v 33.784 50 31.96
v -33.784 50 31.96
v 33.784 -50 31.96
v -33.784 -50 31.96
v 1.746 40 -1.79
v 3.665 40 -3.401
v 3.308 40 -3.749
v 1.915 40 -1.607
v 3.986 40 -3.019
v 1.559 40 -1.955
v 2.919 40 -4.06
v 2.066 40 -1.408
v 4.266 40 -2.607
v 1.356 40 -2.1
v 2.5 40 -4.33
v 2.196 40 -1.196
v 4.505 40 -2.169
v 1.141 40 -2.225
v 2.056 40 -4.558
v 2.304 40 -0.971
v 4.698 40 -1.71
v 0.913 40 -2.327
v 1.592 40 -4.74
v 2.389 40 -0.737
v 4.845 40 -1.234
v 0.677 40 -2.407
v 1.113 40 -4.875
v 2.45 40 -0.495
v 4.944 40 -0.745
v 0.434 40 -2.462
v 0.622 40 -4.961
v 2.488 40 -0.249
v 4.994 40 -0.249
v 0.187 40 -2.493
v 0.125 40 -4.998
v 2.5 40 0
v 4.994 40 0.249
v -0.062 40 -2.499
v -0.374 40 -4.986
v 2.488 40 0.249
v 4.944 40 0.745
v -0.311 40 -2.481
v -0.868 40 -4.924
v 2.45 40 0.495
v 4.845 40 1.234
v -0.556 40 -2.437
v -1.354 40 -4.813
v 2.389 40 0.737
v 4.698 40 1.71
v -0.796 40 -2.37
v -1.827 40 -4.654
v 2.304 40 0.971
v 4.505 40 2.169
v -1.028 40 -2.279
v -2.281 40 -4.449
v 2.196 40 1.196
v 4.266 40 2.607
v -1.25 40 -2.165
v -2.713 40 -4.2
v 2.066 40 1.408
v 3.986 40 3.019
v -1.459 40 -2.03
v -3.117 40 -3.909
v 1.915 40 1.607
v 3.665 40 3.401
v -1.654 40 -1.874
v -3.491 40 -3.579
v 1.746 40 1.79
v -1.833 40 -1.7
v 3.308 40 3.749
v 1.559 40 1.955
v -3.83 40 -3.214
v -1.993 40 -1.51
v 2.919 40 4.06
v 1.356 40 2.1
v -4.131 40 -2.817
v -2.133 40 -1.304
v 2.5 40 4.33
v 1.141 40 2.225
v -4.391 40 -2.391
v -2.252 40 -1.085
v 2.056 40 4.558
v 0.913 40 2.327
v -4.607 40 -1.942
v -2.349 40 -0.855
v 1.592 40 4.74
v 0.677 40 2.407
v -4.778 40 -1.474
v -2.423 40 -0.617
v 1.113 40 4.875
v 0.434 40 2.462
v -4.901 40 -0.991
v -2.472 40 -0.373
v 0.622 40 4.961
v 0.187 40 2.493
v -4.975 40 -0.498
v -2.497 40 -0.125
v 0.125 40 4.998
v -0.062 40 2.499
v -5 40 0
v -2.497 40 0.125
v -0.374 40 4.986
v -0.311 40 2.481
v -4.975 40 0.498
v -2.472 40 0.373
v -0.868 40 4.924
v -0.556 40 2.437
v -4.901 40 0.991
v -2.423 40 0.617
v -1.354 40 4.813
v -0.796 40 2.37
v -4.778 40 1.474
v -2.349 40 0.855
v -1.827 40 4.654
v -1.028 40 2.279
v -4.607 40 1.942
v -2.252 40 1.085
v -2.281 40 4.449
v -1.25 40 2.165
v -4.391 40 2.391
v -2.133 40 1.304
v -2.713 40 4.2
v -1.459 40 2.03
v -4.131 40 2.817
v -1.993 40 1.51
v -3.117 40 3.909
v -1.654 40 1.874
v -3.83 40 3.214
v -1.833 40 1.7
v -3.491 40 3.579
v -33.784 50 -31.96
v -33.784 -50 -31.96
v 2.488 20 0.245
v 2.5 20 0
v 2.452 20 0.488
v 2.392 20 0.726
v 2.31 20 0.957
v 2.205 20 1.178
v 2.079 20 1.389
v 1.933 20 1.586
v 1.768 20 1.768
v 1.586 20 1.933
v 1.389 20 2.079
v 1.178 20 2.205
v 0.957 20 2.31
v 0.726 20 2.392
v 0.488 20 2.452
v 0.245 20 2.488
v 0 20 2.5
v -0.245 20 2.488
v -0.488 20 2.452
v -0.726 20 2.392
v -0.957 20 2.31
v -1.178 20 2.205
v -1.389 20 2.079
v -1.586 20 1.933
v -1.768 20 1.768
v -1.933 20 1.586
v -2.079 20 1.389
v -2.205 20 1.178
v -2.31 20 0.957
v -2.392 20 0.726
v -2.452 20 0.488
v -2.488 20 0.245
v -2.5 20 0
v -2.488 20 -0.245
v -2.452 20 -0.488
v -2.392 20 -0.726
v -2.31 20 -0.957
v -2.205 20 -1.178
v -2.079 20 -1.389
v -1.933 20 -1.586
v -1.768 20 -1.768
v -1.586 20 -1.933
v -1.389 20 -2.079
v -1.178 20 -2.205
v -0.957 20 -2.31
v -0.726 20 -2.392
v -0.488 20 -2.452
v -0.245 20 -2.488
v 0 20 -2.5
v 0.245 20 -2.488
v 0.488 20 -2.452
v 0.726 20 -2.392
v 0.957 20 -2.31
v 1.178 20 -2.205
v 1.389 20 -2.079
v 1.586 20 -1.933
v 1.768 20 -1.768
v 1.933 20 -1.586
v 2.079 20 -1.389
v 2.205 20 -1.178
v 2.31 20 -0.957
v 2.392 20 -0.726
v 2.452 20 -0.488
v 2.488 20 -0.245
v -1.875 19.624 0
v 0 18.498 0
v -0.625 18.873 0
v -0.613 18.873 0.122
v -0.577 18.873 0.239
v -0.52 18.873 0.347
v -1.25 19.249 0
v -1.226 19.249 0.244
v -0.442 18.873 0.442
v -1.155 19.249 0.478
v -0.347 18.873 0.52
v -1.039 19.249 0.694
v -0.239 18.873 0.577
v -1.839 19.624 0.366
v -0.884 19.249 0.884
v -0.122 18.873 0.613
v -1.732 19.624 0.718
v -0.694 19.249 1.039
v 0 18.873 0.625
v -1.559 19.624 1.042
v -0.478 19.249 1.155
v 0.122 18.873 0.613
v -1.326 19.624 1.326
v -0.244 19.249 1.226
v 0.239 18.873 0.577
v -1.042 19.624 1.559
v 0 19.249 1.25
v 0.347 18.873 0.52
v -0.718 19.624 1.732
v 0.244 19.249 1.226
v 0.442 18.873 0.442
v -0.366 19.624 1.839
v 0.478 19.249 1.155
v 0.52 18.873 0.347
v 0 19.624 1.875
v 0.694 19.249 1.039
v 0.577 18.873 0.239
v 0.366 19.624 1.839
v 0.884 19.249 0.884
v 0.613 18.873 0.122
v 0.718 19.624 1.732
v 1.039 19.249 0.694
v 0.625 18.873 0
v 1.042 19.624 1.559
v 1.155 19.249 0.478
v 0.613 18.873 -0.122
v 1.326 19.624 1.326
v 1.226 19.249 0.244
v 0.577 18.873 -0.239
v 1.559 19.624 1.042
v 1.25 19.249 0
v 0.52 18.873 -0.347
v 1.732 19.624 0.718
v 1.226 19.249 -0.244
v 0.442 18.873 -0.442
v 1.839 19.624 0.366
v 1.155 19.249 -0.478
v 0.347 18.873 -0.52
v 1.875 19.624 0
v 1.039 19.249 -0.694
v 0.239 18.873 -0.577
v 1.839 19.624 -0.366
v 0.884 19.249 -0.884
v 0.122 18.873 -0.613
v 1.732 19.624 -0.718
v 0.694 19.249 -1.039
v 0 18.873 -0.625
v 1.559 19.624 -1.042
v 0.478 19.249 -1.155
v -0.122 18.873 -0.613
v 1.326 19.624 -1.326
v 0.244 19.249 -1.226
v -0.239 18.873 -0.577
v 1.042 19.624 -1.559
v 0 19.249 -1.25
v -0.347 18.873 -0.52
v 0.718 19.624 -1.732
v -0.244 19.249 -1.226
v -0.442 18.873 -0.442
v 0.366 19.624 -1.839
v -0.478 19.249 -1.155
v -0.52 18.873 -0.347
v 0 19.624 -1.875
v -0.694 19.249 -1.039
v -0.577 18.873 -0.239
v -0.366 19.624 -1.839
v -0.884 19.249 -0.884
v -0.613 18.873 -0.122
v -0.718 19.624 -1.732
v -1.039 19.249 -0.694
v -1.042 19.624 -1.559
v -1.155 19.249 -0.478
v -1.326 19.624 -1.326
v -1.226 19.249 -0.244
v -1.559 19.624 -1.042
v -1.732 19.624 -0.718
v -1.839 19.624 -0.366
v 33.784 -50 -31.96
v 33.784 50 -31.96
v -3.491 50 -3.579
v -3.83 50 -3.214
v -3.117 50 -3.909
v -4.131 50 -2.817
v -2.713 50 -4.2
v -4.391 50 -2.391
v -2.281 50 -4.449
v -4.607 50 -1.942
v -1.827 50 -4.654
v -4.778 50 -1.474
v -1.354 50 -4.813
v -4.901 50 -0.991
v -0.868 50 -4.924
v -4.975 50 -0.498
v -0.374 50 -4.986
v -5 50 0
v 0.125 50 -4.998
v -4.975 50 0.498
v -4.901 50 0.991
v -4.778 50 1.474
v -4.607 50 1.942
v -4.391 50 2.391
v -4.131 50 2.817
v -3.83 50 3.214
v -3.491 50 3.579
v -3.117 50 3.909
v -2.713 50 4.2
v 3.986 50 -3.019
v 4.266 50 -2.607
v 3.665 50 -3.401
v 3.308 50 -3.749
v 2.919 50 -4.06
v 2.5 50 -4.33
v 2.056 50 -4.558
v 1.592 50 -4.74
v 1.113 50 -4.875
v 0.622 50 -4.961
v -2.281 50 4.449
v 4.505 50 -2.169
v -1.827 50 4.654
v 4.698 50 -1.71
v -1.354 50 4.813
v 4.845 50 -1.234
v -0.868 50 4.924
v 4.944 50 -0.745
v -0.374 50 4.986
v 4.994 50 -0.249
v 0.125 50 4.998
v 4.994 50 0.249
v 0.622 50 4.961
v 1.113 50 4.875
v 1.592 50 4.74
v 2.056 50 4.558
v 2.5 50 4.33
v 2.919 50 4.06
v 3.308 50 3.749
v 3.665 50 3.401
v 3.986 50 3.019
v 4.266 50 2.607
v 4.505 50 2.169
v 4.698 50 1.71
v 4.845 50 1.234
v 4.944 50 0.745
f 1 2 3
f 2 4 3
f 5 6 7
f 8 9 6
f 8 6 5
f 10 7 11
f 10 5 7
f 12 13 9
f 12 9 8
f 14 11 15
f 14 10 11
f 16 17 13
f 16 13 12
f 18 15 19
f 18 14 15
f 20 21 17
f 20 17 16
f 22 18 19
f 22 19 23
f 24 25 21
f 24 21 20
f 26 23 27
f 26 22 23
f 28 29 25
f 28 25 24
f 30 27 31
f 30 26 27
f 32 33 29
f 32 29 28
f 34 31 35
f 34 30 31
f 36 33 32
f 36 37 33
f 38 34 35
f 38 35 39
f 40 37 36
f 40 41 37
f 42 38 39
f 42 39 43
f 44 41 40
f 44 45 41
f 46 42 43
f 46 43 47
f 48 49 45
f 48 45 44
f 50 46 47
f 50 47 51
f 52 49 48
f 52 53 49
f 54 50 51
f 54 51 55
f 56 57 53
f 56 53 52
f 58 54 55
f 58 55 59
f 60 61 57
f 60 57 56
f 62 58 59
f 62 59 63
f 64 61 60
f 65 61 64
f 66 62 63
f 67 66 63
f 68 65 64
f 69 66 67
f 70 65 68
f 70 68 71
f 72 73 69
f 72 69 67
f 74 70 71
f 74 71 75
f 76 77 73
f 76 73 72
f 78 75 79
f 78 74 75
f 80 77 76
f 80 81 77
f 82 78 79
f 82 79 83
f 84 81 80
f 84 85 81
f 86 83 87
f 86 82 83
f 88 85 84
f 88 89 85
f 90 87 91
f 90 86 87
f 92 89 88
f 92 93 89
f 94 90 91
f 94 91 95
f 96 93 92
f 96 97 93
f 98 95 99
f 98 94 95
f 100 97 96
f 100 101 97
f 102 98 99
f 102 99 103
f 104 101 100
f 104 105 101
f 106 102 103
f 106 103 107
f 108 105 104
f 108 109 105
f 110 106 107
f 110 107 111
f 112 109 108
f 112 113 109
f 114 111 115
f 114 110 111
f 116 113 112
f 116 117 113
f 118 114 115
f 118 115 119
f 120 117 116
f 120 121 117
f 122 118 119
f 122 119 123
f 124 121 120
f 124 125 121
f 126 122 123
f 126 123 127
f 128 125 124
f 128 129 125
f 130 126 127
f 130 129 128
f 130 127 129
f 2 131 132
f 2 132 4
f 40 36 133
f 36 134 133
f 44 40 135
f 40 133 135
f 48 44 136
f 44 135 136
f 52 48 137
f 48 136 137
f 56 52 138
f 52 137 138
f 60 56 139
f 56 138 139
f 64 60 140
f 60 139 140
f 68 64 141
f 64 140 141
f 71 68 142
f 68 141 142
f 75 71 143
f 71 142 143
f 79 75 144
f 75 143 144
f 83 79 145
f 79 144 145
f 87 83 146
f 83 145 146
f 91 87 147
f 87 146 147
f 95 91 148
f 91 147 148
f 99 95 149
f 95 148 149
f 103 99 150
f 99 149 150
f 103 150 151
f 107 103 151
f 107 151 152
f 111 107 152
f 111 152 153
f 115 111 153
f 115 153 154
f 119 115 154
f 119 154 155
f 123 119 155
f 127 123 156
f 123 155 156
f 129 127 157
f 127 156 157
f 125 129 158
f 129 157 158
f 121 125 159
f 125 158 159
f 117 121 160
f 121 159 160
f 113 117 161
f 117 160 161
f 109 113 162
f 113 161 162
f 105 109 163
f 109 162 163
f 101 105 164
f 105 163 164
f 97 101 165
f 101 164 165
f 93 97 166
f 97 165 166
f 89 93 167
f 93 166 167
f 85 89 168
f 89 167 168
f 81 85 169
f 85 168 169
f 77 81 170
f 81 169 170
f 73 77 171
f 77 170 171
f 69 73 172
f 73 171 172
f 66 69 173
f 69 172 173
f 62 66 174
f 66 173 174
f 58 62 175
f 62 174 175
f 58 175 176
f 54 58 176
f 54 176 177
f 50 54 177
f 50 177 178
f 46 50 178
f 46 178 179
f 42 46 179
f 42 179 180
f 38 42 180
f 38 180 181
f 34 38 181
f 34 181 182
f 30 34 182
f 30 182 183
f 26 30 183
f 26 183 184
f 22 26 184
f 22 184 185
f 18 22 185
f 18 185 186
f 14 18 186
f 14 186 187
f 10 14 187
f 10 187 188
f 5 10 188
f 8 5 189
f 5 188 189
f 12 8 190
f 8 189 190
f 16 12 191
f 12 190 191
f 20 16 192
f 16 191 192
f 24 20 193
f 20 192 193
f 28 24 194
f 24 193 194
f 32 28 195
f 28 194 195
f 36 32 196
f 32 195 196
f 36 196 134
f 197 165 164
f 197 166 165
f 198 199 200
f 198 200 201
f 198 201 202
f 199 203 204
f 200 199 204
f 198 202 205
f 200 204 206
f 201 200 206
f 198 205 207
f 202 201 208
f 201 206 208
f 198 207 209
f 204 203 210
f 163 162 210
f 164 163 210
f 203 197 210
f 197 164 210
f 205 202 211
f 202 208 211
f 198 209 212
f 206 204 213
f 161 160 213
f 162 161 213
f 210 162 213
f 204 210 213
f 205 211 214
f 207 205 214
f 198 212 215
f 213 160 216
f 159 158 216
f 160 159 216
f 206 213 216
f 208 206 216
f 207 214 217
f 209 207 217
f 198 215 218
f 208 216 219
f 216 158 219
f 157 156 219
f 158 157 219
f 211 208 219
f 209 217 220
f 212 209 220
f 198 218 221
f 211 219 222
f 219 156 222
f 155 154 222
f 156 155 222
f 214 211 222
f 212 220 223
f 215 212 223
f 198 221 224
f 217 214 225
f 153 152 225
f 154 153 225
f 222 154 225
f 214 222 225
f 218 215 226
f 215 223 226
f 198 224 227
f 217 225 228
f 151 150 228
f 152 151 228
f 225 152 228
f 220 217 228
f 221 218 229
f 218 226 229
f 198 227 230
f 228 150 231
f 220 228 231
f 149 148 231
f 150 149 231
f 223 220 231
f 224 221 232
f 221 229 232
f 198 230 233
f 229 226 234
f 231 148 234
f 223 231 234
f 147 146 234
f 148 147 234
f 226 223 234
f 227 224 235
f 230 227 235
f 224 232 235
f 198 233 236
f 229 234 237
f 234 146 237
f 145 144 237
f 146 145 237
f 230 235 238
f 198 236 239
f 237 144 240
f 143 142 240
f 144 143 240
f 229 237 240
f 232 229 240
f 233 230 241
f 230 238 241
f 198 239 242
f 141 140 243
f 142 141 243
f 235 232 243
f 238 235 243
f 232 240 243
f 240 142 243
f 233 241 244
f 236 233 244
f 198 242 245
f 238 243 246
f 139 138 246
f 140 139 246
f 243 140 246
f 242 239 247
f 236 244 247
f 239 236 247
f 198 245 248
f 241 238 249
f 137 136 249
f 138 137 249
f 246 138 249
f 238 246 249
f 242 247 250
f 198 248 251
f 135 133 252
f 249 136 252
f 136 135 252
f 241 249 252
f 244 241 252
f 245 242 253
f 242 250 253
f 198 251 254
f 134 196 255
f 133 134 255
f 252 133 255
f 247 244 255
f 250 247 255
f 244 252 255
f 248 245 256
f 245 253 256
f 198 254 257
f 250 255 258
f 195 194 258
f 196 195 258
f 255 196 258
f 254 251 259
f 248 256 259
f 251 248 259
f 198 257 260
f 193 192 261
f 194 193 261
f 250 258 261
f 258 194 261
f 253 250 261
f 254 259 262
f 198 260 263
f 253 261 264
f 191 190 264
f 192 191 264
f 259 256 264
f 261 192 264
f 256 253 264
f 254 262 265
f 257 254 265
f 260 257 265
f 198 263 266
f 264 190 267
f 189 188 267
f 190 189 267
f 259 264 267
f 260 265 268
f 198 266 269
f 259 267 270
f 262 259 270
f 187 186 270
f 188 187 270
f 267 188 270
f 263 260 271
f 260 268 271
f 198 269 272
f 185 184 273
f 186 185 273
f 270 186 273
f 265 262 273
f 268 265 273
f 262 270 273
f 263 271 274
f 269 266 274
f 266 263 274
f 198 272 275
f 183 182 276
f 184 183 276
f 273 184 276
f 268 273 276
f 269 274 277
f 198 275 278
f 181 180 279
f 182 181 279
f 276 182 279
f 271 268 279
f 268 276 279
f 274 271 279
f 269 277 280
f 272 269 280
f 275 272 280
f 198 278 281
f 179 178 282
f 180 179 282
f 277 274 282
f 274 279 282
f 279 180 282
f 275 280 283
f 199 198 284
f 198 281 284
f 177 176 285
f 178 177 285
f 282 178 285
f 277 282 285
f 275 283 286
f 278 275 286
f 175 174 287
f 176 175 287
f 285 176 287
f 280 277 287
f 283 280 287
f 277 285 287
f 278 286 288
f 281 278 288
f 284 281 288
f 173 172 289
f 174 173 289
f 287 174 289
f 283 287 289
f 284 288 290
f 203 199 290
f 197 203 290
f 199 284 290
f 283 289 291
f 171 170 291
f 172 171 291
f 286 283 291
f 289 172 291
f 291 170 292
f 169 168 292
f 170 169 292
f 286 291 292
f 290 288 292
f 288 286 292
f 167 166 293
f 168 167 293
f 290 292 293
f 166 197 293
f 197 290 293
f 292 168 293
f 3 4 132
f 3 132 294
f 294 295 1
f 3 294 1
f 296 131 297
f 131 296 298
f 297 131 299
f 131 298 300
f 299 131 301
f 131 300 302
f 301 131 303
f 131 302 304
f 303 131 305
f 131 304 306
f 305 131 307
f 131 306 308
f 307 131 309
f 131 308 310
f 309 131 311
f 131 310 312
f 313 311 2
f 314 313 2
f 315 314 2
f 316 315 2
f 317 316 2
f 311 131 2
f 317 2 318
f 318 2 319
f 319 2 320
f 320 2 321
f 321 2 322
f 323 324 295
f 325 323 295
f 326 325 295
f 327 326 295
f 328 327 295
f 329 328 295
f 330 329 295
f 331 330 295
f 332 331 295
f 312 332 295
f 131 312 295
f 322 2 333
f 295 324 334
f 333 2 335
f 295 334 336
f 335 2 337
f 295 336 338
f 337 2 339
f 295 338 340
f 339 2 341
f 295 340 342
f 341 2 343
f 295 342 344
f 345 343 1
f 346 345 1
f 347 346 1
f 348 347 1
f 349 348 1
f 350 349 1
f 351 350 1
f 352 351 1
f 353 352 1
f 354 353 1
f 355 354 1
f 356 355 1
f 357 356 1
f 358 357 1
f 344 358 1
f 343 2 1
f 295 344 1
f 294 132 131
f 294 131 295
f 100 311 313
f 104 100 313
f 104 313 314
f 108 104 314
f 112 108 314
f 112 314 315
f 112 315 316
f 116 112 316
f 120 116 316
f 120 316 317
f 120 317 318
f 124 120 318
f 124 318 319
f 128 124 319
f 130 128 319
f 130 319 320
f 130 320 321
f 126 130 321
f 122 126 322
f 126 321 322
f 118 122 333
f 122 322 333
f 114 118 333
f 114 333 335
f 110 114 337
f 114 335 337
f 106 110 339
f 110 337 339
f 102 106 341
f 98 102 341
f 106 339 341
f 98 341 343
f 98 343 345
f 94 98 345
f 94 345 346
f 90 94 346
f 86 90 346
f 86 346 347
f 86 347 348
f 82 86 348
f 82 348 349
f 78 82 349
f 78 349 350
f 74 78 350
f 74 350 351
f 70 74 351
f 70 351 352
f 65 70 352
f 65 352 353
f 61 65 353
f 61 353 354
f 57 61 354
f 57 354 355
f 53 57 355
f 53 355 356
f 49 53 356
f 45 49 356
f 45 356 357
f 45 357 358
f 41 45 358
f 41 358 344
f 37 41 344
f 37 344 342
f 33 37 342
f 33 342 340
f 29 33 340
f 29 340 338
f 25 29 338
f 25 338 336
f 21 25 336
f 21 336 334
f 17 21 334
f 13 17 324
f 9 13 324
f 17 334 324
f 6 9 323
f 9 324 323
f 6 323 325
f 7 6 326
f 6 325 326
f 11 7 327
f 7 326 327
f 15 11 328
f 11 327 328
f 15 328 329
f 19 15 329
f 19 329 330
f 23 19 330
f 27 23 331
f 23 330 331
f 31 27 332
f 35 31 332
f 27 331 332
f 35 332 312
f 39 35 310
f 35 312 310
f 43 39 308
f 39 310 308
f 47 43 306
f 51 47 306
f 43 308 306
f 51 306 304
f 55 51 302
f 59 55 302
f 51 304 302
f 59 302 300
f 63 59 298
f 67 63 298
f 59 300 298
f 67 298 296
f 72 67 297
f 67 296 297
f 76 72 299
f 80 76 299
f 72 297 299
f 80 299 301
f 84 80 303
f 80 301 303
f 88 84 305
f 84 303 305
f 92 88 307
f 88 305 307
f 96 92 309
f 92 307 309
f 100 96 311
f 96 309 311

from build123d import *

# Parameters (mm, degrees)
F0_W           = 67.567974329
F0_H           = 63.9199391007
F1_DEPTH       = 50
F2_DEPTH       = 50
F4_D           = 5
F4_DEPTH       = 30
F4_CBORE_D     = 10
F4_CBORE_DEPTH = 10
F4_TIP         = 1.5021515476


with BuildPart() as f1:
    # F0 (on Front) → F1 (new body)
    with BuildSketch(Plane.XZ):
        Rectangle(F0_W, F0_H)
    extrude(amount=F1_DEPTH)

    # F2 (add): a face of the model
    f2_faces = [f1.faces().sort_by_distance(p)[0] for p in [
        (0, 0, 0),
    ]]
    extrude(f2_faces, amount=F2_DEPTH)

    # F4
    with Locations(Plane(origin=(0, 50, 0), x_dir=(-1, 0, 0), z_dir=(0, 1, 0))):
        with Locations((0, 0)):
            CounterBoreHole(F4_D / 2, F4_CBORE_D / 2, F4_CBORE_DEPTH, depth=F4_DEPTH)
            with Locations((0, 0, -(F4_DEPTH + F4_TIP / 2))):  # 118° drill point
                Cone(0, F4_D / 2, F4_TIP, mode=Mode.SUBTRACT)


solid = f1.part
